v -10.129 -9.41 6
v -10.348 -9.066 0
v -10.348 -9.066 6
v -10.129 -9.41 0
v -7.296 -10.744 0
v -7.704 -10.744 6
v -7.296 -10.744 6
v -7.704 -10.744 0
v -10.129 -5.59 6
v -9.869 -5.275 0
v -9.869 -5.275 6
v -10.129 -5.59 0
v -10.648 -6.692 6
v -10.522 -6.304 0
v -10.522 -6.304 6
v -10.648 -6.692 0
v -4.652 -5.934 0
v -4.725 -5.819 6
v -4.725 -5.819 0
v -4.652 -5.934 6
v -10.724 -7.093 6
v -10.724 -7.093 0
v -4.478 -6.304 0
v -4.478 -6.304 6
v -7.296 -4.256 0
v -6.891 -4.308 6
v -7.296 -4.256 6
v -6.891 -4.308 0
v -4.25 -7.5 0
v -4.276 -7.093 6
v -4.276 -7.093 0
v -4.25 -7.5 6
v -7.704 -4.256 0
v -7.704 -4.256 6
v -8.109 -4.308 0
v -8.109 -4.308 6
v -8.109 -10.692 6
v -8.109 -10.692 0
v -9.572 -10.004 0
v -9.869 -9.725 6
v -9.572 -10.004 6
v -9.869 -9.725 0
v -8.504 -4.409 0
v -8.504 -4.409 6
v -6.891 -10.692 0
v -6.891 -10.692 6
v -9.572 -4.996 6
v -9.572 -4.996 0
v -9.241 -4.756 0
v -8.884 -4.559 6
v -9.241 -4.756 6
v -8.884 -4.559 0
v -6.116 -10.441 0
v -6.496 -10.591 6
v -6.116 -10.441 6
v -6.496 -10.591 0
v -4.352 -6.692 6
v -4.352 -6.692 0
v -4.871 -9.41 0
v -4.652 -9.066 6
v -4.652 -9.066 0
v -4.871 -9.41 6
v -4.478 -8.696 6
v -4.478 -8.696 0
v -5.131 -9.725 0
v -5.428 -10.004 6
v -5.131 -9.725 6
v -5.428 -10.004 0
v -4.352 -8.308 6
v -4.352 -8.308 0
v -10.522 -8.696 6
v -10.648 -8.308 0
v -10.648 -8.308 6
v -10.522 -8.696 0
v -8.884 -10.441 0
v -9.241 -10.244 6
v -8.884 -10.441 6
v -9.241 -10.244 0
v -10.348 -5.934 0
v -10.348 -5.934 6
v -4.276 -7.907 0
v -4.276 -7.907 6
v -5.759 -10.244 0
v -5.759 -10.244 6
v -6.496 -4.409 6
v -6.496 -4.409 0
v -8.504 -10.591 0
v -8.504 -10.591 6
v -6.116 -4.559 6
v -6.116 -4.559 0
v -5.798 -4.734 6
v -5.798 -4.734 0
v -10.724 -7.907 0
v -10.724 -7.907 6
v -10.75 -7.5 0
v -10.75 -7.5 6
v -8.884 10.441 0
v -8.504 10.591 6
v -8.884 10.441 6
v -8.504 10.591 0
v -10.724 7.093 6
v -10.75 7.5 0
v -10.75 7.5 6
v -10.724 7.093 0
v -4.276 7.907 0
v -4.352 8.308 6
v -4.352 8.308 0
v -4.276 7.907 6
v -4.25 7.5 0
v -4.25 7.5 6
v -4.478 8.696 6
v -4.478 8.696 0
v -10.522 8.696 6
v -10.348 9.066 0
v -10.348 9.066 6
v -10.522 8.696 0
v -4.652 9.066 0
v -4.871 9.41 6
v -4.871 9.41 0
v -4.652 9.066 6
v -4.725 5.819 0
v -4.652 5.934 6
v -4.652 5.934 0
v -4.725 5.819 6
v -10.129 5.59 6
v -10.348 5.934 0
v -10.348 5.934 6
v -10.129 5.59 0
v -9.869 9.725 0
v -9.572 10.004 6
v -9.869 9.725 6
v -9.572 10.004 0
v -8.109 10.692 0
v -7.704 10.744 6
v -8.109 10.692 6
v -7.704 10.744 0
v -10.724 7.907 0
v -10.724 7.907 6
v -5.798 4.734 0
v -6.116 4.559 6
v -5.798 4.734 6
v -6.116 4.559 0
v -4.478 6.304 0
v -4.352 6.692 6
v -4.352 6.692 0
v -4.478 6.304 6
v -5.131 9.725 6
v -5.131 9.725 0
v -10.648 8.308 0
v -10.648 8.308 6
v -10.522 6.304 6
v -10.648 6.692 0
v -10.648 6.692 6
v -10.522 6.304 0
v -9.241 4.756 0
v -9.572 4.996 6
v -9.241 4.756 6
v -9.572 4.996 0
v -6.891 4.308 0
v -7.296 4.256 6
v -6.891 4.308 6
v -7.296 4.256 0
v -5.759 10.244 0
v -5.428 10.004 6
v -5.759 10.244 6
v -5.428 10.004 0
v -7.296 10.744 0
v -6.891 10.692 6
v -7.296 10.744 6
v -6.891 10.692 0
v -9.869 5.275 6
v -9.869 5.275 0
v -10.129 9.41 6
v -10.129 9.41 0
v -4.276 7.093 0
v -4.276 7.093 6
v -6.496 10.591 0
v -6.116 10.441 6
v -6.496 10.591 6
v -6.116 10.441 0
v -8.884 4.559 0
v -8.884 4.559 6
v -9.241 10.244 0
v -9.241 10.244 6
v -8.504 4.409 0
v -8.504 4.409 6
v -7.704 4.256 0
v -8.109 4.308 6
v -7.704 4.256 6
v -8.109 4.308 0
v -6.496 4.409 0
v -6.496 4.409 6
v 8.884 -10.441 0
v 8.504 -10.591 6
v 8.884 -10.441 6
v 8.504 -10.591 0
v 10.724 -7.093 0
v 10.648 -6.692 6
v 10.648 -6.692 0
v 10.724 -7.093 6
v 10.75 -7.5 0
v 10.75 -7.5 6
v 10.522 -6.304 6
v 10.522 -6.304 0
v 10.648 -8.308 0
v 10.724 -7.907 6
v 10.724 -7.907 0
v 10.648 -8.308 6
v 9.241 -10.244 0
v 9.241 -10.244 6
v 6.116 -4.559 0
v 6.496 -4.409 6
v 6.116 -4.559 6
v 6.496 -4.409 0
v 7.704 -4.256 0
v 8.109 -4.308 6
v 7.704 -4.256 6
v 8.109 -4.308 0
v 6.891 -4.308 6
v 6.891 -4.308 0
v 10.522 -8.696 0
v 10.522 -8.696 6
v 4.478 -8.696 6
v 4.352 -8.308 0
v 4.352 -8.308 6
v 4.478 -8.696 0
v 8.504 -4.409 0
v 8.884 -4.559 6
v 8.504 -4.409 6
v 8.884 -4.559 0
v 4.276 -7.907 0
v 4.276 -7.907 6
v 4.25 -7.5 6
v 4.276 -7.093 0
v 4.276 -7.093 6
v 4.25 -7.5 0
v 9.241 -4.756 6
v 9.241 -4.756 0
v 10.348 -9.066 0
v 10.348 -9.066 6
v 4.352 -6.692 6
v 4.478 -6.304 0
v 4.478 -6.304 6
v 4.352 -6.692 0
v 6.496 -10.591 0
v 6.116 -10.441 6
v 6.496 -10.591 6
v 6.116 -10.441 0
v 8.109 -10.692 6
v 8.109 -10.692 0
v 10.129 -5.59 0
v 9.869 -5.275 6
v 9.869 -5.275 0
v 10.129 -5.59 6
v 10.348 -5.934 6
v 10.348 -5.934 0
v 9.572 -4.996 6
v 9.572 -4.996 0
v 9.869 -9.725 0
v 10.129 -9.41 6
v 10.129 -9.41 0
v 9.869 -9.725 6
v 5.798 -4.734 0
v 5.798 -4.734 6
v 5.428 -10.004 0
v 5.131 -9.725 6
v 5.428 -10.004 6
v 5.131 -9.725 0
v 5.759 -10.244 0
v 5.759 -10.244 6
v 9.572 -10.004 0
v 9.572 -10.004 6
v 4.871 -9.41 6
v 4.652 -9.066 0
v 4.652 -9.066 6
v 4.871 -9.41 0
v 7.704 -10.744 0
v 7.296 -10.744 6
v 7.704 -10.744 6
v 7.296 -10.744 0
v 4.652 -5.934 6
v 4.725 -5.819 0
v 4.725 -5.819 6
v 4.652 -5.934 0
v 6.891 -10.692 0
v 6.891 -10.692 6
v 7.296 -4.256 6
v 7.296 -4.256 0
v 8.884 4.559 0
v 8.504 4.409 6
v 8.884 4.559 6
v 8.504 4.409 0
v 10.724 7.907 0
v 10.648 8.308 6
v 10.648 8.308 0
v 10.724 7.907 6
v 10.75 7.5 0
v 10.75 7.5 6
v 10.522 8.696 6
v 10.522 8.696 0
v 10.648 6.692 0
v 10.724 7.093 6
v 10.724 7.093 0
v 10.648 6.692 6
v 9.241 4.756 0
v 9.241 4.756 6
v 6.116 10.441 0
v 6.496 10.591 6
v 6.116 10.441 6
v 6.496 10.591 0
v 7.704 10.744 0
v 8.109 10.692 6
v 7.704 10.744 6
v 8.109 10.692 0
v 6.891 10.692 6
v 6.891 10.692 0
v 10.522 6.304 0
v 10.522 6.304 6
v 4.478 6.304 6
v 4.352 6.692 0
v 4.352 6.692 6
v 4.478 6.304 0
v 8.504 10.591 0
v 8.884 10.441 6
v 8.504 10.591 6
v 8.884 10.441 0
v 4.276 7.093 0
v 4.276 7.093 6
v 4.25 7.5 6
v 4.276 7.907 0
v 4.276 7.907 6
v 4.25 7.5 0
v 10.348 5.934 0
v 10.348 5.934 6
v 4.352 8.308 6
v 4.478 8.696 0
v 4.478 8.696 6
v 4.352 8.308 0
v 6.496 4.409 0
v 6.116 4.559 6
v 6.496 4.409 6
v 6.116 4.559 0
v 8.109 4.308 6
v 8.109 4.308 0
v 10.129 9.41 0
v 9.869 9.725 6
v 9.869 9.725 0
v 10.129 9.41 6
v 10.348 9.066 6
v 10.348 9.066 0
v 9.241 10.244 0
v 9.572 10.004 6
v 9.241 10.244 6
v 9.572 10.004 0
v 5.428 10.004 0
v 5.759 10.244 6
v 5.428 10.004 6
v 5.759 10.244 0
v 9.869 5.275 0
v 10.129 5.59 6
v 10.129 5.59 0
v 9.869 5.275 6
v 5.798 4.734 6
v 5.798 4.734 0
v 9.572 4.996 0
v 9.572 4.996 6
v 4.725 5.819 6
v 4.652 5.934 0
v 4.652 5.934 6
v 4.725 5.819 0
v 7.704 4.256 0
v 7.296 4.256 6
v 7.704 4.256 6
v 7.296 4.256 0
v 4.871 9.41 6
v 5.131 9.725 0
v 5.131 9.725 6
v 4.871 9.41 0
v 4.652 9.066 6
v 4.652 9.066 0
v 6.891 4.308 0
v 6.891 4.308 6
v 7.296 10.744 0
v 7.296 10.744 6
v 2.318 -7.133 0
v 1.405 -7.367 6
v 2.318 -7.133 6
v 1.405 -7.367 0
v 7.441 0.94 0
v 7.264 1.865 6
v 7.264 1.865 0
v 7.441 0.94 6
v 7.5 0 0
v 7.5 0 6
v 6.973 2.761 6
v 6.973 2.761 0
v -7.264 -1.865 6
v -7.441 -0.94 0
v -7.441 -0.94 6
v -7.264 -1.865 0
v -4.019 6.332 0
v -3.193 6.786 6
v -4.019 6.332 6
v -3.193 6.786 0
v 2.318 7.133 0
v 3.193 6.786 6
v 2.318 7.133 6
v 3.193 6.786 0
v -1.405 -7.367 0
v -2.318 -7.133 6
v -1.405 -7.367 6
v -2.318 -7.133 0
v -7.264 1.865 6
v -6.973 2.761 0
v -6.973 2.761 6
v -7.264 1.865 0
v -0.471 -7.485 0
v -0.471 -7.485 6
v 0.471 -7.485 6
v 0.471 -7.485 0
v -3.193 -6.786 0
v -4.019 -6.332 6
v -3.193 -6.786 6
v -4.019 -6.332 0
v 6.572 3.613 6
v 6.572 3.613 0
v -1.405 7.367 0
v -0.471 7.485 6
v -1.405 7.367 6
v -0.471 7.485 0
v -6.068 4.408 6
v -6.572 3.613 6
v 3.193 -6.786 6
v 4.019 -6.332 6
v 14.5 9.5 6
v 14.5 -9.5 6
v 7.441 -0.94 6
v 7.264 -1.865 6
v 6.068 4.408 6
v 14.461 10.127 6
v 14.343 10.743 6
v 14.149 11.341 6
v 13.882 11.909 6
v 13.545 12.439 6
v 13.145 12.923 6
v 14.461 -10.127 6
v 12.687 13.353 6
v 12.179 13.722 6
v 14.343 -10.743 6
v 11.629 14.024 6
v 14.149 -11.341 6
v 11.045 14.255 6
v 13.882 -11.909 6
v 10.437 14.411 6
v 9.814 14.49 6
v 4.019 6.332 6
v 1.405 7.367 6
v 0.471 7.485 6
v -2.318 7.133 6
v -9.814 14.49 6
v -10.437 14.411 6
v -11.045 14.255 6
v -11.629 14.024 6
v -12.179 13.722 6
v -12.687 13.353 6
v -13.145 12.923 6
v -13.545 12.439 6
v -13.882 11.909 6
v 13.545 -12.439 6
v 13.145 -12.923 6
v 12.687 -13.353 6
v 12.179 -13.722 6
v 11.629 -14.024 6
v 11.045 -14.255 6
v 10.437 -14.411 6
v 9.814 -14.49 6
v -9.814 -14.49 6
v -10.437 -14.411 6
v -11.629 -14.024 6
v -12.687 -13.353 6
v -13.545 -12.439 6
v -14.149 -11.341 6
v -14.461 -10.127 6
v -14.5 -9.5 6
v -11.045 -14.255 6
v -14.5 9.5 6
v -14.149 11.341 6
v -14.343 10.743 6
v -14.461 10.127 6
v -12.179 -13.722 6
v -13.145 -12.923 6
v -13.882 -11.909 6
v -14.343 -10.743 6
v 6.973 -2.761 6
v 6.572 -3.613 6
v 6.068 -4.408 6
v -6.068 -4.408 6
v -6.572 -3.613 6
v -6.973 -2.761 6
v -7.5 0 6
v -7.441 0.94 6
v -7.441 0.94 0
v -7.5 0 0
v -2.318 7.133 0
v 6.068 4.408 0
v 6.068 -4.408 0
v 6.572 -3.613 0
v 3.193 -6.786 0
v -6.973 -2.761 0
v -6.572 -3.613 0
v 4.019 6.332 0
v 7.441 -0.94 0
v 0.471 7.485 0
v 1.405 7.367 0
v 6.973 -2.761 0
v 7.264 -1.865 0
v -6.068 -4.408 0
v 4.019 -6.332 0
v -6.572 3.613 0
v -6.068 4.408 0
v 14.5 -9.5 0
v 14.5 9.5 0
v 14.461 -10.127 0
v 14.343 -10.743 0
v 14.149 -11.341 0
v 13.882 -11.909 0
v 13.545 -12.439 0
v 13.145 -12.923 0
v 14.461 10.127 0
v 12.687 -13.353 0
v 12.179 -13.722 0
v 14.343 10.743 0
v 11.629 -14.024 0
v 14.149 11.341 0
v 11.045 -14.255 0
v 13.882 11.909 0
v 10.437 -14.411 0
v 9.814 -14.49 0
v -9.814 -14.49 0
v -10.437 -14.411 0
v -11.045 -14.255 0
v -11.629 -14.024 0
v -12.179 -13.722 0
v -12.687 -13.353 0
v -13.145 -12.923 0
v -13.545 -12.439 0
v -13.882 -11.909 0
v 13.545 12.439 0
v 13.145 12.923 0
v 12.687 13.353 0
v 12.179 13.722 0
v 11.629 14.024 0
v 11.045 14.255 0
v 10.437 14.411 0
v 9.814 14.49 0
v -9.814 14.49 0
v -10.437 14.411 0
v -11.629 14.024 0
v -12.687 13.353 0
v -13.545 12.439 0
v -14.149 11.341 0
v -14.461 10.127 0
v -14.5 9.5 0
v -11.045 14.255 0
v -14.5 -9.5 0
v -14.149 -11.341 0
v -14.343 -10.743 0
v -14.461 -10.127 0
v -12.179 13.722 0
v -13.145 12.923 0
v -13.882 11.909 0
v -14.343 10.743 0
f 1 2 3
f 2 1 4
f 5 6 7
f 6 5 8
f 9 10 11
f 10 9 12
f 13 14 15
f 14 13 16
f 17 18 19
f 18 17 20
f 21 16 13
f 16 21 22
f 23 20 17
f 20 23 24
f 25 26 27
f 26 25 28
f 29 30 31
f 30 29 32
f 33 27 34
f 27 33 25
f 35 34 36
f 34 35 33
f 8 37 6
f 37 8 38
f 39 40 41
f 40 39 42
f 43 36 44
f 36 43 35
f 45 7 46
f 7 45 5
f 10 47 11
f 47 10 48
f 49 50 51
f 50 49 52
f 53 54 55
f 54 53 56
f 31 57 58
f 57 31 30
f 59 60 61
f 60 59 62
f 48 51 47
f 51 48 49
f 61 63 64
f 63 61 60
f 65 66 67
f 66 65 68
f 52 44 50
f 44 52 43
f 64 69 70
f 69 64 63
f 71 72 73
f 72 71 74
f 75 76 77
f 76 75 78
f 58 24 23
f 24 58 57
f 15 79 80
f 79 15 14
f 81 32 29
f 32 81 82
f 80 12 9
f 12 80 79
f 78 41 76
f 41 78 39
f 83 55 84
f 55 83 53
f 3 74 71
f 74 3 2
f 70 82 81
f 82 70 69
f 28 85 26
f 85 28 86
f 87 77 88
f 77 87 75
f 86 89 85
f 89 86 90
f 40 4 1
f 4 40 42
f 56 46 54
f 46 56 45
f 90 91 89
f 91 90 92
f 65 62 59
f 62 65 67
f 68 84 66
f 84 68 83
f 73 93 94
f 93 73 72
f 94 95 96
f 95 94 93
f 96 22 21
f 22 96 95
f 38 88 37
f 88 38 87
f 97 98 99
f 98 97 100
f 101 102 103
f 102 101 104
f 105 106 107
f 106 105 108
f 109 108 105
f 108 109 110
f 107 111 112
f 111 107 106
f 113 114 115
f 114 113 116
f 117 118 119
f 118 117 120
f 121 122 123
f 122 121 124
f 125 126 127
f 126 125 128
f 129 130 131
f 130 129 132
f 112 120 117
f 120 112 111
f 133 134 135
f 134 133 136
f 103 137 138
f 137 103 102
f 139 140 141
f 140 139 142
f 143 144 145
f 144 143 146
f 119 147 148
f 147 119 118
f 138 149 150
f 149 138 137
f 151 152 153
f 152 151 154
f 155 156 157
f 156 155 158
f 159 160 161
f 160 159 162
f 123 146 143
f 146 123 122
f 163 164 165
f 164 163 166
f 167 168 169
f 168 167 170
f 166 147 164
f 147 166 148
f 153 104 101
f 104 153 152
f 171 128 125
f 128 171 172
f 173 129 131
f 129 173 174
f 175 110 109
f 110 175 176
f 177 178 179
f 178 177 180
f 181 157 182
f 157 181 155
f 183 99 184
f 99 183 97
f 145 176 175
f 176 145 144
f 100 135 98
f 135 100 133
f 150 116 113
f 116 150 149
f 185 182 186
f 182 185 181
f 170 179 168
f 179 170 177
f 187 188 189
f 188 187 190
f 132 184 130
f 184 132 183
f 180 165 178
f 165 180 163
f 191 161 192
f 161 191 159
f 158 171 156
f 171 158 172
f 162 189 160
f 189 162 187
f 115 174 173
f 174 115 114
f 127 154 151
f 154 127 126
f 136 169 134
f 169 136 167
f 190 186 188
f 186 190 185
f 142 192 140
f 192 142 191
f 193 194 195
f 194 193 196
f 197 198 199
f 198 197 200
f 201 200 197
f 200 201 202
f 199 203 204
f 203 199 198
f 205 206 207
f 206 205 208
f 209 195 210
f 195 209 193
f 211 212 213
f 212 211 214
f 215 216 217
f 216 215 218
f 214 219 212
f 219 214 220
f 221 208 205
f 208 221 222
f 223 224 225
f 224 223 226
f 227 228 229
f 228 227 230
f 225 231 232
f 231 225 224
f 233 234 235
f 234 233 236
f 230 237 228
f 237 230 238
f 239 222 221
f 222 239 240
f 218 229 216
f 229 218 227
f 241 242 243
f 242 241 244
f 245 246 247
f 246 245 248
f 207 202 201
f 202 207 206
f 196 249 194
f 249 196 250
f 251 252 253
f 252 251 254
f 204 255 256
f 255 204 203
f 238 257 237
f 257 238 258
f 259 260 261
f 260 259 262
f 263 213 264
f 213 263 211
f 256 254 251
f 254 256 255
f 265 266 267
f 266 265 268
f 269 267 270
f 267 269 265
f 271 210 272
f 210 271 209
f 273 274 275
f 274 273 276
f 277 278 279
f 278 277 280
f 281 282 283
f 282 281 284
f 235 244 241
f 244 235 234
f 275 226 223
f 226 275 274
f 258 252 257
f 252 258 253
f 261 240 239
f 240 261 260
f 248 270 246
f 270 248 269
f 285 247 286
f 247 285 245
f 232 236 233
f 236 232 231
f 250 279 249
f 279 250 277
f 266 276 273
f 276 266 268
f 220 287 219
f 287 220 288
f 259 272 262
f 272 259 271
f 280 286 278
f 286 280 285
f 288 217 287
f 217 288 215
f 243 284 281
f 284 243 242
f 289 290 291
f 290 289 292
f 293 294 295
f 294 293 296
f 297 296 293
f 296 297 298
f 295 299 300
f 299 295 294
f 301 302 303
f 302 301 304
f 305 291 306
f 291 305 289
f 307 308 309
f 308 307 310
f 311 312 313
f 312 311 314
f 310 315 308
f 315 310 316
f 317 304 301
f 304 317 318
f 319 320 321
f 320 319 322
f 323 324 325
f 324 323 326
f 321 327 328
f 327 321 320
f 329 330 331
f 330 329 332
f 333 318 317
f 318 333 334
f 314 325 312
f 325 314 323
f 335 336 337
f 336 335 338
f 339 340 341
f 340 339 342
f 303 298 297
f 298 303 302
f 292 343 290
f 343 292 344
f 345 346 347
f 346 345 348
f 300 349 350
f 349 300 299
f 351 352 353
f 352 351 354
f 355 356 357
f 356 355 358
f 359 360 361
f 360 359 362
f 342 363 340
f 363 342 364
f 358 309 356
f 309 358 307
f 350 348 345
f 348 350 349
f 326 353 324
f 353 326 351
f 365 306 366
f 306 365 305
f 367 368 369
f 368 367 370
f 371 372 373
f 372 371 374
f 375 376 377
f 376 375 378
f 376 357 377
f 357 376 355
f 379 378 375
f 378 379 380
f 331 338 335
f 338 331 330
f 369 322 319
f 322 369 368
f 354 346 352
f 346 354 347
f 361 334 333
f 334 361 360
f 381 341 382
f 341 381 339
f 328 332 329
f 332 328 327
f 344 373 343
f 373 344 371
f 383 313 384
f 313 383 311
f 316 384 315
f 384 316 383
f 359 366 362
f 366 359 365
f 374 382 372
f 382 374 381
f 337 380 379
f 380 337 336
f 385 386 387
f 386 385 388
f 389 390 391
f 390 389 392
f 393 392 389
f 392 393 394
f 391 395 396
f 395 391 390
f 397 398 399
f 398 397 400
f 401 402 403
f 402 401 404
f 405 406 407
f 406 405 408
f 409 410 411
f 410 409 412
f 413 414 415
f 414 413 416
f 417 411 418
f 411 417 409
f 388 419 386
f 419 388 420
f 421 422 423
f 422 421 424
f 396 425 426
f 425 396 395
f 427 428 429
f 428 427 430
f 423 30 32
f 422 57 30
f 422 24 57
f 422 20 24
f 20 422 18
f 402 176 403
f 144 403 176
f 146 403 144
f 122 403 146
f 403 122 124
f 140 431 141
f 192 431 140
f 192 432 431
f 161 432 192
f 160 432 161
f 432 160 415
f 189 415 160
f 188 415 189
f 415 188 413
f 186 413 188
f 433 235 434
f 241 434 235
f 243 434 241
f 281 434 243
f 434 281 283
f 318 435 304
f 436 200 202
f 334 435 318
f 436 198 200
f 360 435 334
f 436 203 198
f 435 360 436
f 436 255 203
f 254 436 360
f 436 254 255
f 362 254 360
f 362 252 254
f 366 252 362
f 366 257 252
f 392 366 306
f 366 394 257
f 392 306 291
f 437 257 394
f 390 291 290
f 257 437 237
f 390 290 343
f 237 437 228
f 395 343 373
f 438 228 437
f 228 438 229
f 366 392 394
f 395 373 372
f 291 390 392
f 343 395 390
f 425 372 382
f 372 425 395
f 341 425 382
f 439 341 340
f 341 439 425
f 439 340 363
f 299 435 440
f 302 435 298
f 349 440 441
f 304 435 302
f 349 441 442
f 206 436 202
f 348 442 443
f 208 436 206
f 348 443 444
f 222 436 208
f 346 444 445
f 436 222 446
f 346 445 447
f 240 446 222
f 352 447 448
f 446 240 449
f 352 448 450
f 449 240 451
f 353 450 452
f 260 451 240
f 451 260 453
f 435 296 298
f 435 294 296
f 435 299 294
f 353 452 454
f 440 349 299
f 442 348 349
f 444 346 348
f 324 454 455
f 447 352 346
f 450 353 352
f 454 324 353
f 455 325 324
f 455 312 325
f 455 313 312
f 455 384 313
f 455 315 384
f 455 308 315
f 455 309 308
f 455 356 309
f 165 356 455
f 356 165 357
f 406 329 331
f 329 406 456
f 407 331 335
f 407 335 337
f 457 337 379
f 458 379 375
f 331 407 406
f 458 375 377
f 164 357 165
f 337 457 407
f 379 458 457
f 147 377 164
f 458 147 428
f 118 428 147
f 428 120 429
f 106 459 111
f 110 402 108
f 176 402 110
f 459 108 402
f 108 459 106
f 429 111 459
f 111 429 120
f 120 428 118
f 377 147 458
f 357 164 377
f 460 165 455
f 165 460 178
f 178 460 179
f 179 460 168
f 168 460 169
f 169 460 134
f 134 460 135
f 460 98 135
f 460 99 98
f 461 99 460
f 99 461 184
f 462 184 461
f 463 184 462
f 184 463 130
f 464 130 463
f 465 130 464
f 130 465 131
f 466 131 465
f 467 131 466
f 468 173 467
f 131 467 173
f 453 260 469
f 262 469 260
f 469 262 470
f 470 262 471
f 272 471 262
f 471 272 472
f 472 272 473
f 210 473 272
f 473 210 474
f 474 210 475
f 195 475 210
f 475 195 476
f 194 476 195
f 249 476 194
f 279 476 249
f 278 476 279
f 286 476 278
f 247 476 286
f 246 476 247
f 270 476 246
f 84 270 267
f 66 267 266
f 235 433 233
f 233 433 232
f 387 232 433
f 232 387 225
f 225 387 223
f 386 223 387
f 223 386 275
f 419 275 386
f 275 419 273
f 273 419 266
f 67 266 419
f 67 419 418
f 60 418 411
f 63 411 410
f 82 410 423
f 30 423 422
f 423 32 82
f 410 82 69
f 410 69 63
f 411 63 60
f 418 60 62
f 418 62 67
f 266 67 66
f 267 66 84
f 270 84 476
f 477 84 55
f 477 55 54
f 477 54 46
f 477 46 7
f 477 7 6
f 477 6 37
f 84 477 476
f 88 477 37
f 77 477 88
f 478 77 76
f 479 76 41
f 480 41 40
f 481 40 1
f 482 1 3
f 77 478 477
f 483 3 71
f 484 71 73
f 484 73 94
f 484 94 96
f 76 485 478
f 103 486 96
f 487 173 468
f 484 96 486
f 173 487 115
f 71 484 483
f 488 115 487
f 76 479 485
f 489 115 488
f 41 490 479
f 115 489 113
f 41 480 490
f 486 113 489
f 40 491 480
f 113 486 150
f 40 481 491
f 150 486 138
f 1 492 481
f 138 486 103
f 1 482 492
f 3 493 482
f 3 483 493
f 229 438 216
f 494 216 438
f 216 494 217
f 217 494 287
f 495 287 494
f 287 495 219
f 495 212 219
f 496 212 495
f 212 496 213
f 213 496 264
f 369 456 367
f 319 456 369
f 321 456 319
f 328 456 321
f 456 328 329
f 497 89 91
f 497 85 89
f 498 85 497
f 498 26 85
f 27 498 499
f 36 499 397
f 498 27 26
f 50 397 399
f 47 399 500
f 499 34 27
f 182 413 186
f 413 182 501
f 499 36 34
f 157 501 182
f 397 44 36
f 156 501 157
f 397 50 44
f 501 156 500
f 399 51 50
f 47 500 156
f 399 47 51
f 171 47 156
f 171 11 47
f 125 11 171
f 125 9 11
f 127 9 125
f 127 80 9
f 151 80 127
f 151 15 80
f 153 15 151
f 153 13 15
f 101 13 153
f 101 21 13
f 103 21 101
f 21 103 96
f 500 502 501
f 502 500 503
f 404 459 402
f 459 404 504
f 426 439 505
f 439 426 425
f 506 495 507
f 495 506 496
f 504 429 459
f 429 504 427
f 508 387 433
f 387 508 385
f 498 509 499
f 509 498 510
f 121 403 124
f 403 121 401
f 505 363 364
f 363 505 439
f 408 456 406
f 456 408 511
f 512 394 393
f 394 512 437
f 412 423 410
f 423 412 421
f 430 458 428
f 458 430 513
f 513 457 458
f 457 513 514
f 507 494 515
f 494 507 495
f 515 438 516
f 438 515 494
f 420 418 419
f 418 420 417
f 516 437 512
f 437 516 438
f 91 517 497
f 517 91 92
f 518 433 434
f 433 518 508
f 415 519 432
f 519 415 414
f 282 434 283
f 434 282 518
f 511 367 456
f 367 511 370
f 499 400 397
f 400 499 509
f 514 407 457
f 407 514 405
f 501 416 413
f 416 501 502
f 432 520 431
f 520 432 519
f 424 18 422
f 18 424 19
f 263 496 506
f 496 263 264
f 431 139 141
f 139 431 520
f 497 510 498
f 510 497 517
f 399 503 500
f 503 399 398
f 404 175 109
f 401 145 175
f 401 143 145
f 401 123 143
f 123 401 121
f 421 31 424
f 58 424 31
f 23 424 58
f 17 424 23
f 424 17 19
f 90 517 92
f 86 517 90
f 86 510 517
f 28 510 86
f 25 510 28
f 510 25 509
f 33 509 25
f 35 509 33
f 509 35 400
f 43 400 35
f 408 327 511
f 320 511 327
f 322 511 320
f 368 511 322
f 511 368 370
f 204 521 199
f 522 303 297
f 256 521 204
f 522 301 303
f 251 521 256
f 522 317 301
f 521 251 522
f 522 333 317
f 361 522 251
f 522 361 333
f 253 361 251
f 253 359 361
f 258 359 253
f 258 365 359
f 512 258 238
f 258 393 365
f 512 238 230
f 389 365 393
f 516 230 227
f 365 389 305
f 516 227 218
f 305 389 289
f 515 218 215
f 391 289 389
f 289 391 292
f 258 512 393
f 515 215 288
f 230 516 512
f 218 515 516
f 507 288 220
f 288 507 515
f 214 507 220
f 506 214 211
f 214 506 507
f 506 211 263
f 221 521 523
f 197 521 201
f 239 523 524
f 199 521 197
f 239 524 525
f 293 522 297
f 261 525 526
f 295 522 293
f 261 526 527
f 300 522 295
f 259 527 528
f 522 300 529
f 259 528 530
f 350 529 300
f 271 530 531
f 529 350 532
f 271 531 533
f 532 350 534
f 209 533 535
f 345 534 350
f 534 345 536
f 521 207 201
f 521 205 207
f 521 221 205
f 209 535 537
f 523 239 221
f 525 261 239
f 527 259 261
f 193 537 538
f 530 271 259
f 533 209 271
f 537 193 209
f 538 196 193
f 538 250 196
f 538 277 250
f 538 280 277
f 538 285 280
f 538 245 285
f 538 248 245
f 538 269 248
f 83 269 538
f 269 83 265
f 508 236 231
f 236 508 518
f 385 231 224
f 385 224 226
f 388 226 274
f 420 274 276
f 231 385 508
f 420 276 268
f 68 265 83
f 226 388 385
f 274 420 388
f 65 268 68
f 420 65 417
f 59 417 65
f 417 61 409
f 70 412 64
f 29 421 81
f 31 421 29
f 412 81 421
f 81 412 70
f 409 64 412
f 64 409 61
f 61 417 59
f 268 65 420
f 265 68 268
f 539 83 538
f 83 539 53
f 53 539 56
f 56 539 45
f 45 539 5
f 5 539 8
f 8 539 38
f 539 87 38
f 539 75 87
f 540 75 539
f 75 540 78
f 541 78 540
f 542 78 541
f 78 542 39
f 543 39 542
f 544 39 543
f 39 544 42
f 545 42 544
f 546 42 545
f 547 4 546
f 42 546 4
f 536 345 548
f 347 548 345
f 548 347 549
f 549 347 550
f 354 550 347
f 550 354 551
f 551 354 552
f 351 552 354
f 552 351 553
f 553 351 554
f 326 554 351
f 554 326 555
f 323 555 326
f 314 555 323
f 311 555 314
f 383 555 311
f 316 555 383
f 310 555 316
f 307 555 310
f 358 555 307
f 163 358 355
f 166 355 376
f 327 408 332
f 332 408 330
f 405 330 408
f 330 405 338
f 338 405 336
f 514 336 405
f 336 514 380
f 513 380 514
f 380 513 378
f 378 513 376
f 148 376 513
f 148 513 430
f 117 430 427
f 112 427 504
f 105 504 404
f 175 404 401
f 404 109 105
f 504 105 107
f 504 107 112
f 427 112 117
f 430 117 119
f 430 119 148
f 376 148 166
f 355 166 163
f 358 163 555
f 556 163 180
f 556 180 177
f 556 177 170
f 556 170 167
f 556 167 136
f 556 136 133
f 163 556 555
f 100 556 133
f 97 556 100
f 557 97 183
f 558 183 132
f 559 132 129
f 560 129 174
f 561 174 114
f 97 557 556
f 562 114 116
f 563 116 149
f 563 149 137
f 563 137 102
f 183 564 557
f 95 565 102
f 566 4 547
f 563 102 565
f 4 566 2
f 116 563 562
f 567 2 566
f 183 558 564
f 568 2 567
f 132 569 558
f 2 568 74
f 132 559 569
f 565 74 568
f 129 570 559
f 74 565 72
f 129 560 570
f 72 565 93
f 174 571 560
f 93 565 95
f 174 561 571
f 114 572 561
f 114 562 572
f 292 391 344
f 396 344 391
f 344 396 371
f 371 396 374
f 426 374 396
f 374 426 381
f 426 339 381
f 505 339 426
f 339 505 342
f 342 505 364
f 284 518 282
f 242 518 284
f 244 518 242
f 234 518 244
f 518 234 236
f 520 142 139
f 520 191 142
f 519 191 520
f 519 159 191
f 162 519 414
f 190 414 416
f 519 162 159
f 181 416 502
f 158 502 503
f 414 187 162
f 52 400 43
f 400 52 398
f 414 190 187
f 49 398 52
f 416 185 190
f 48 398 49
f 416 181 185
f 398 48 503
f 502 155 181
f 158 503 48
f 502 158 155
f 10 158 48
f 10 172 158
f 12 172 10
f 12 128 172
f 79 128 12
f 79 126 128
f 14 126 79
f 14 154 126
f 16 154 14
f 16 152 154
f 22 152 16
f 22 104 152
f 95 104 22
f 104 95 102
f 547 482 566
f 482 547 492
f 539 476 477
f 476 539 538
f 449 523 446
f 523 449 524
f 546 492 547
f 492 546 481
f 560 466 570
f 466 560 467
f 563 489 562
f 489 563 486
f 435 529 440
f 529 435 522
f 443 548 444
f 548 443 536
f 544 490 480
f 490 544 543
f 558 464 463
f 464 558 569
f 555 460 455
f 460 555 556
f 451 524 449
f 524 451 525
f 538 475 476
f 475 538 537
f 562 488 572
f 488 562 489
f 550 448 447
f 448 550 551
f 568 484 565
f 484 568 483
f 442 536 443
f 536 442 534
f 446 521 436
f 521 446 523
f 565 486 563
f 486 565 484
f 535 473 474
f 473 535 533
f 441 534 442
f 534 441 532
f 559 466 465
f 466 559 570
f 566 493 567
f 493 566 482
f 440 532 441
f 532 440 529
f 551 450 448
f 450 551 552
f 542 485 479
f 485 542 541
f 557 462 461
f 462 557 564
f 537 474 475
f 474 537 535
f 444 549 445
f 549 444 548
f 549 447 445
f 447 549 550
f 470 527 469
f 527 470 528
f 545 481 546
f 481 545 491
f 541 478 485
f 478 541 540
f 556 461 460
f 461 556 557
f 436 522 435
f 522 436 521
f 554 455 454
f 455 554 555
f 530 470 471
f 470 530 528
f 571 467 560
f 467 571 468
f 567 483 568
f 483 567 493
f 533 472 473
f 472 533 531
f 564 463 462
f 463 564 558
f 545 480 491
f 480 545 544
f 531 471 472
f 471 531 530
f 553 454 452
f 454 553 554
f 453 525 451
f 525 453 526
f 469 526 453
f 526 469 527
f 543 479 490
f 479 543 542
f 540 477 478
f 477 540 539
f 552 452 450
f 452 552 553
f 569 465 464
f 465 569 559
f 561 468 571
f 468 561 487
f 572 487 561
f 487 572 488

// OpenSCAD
$fn = 50;


difference() {
	union() {
		hull() {
			translate(v = [-9.5000000000, 9.5000000000, 0]) {
				cylinder(h = 6, r = 5);
			}
			translate(v = [9.5000000000, 9.5000000000, 0]) {
				cylinder(h = 6, r = 5);
			}
			translate(v = [-9.5000000000, -9.5000000000, 0]) {
				cylinder(h = 6, r = 5);
			}
			translate(v = [9.5000000000, -9.5000000000, 0]) {
				cylinder(h = 6, r = 5);
			}
		}
	}
	union() {
		#translate(v = [-7.5000000000, -7.5000000000, -100.0000000000]) {
			cylinder(h = 200, r = 3.2500000000);
		}
		#translate(v = [-7.5000000000, 7.5000000000, -100.0000000000]) {
			cylinder(h = 200, r = 3.2500000000);
		}
		#translate(v = [7.5000000000, -7.5000000000, -100.0000000000]) {
			cylinder(h = 200, r = 3.2500000000);
		}
		#translate(v = [7.5000000000, 7.5000000000, -100.0000000000]) {
			cylinder(h = 200, r = 3.2500000000);
		}
		#cylinder(h = 6, r = 7.5000000000);
	}
}
